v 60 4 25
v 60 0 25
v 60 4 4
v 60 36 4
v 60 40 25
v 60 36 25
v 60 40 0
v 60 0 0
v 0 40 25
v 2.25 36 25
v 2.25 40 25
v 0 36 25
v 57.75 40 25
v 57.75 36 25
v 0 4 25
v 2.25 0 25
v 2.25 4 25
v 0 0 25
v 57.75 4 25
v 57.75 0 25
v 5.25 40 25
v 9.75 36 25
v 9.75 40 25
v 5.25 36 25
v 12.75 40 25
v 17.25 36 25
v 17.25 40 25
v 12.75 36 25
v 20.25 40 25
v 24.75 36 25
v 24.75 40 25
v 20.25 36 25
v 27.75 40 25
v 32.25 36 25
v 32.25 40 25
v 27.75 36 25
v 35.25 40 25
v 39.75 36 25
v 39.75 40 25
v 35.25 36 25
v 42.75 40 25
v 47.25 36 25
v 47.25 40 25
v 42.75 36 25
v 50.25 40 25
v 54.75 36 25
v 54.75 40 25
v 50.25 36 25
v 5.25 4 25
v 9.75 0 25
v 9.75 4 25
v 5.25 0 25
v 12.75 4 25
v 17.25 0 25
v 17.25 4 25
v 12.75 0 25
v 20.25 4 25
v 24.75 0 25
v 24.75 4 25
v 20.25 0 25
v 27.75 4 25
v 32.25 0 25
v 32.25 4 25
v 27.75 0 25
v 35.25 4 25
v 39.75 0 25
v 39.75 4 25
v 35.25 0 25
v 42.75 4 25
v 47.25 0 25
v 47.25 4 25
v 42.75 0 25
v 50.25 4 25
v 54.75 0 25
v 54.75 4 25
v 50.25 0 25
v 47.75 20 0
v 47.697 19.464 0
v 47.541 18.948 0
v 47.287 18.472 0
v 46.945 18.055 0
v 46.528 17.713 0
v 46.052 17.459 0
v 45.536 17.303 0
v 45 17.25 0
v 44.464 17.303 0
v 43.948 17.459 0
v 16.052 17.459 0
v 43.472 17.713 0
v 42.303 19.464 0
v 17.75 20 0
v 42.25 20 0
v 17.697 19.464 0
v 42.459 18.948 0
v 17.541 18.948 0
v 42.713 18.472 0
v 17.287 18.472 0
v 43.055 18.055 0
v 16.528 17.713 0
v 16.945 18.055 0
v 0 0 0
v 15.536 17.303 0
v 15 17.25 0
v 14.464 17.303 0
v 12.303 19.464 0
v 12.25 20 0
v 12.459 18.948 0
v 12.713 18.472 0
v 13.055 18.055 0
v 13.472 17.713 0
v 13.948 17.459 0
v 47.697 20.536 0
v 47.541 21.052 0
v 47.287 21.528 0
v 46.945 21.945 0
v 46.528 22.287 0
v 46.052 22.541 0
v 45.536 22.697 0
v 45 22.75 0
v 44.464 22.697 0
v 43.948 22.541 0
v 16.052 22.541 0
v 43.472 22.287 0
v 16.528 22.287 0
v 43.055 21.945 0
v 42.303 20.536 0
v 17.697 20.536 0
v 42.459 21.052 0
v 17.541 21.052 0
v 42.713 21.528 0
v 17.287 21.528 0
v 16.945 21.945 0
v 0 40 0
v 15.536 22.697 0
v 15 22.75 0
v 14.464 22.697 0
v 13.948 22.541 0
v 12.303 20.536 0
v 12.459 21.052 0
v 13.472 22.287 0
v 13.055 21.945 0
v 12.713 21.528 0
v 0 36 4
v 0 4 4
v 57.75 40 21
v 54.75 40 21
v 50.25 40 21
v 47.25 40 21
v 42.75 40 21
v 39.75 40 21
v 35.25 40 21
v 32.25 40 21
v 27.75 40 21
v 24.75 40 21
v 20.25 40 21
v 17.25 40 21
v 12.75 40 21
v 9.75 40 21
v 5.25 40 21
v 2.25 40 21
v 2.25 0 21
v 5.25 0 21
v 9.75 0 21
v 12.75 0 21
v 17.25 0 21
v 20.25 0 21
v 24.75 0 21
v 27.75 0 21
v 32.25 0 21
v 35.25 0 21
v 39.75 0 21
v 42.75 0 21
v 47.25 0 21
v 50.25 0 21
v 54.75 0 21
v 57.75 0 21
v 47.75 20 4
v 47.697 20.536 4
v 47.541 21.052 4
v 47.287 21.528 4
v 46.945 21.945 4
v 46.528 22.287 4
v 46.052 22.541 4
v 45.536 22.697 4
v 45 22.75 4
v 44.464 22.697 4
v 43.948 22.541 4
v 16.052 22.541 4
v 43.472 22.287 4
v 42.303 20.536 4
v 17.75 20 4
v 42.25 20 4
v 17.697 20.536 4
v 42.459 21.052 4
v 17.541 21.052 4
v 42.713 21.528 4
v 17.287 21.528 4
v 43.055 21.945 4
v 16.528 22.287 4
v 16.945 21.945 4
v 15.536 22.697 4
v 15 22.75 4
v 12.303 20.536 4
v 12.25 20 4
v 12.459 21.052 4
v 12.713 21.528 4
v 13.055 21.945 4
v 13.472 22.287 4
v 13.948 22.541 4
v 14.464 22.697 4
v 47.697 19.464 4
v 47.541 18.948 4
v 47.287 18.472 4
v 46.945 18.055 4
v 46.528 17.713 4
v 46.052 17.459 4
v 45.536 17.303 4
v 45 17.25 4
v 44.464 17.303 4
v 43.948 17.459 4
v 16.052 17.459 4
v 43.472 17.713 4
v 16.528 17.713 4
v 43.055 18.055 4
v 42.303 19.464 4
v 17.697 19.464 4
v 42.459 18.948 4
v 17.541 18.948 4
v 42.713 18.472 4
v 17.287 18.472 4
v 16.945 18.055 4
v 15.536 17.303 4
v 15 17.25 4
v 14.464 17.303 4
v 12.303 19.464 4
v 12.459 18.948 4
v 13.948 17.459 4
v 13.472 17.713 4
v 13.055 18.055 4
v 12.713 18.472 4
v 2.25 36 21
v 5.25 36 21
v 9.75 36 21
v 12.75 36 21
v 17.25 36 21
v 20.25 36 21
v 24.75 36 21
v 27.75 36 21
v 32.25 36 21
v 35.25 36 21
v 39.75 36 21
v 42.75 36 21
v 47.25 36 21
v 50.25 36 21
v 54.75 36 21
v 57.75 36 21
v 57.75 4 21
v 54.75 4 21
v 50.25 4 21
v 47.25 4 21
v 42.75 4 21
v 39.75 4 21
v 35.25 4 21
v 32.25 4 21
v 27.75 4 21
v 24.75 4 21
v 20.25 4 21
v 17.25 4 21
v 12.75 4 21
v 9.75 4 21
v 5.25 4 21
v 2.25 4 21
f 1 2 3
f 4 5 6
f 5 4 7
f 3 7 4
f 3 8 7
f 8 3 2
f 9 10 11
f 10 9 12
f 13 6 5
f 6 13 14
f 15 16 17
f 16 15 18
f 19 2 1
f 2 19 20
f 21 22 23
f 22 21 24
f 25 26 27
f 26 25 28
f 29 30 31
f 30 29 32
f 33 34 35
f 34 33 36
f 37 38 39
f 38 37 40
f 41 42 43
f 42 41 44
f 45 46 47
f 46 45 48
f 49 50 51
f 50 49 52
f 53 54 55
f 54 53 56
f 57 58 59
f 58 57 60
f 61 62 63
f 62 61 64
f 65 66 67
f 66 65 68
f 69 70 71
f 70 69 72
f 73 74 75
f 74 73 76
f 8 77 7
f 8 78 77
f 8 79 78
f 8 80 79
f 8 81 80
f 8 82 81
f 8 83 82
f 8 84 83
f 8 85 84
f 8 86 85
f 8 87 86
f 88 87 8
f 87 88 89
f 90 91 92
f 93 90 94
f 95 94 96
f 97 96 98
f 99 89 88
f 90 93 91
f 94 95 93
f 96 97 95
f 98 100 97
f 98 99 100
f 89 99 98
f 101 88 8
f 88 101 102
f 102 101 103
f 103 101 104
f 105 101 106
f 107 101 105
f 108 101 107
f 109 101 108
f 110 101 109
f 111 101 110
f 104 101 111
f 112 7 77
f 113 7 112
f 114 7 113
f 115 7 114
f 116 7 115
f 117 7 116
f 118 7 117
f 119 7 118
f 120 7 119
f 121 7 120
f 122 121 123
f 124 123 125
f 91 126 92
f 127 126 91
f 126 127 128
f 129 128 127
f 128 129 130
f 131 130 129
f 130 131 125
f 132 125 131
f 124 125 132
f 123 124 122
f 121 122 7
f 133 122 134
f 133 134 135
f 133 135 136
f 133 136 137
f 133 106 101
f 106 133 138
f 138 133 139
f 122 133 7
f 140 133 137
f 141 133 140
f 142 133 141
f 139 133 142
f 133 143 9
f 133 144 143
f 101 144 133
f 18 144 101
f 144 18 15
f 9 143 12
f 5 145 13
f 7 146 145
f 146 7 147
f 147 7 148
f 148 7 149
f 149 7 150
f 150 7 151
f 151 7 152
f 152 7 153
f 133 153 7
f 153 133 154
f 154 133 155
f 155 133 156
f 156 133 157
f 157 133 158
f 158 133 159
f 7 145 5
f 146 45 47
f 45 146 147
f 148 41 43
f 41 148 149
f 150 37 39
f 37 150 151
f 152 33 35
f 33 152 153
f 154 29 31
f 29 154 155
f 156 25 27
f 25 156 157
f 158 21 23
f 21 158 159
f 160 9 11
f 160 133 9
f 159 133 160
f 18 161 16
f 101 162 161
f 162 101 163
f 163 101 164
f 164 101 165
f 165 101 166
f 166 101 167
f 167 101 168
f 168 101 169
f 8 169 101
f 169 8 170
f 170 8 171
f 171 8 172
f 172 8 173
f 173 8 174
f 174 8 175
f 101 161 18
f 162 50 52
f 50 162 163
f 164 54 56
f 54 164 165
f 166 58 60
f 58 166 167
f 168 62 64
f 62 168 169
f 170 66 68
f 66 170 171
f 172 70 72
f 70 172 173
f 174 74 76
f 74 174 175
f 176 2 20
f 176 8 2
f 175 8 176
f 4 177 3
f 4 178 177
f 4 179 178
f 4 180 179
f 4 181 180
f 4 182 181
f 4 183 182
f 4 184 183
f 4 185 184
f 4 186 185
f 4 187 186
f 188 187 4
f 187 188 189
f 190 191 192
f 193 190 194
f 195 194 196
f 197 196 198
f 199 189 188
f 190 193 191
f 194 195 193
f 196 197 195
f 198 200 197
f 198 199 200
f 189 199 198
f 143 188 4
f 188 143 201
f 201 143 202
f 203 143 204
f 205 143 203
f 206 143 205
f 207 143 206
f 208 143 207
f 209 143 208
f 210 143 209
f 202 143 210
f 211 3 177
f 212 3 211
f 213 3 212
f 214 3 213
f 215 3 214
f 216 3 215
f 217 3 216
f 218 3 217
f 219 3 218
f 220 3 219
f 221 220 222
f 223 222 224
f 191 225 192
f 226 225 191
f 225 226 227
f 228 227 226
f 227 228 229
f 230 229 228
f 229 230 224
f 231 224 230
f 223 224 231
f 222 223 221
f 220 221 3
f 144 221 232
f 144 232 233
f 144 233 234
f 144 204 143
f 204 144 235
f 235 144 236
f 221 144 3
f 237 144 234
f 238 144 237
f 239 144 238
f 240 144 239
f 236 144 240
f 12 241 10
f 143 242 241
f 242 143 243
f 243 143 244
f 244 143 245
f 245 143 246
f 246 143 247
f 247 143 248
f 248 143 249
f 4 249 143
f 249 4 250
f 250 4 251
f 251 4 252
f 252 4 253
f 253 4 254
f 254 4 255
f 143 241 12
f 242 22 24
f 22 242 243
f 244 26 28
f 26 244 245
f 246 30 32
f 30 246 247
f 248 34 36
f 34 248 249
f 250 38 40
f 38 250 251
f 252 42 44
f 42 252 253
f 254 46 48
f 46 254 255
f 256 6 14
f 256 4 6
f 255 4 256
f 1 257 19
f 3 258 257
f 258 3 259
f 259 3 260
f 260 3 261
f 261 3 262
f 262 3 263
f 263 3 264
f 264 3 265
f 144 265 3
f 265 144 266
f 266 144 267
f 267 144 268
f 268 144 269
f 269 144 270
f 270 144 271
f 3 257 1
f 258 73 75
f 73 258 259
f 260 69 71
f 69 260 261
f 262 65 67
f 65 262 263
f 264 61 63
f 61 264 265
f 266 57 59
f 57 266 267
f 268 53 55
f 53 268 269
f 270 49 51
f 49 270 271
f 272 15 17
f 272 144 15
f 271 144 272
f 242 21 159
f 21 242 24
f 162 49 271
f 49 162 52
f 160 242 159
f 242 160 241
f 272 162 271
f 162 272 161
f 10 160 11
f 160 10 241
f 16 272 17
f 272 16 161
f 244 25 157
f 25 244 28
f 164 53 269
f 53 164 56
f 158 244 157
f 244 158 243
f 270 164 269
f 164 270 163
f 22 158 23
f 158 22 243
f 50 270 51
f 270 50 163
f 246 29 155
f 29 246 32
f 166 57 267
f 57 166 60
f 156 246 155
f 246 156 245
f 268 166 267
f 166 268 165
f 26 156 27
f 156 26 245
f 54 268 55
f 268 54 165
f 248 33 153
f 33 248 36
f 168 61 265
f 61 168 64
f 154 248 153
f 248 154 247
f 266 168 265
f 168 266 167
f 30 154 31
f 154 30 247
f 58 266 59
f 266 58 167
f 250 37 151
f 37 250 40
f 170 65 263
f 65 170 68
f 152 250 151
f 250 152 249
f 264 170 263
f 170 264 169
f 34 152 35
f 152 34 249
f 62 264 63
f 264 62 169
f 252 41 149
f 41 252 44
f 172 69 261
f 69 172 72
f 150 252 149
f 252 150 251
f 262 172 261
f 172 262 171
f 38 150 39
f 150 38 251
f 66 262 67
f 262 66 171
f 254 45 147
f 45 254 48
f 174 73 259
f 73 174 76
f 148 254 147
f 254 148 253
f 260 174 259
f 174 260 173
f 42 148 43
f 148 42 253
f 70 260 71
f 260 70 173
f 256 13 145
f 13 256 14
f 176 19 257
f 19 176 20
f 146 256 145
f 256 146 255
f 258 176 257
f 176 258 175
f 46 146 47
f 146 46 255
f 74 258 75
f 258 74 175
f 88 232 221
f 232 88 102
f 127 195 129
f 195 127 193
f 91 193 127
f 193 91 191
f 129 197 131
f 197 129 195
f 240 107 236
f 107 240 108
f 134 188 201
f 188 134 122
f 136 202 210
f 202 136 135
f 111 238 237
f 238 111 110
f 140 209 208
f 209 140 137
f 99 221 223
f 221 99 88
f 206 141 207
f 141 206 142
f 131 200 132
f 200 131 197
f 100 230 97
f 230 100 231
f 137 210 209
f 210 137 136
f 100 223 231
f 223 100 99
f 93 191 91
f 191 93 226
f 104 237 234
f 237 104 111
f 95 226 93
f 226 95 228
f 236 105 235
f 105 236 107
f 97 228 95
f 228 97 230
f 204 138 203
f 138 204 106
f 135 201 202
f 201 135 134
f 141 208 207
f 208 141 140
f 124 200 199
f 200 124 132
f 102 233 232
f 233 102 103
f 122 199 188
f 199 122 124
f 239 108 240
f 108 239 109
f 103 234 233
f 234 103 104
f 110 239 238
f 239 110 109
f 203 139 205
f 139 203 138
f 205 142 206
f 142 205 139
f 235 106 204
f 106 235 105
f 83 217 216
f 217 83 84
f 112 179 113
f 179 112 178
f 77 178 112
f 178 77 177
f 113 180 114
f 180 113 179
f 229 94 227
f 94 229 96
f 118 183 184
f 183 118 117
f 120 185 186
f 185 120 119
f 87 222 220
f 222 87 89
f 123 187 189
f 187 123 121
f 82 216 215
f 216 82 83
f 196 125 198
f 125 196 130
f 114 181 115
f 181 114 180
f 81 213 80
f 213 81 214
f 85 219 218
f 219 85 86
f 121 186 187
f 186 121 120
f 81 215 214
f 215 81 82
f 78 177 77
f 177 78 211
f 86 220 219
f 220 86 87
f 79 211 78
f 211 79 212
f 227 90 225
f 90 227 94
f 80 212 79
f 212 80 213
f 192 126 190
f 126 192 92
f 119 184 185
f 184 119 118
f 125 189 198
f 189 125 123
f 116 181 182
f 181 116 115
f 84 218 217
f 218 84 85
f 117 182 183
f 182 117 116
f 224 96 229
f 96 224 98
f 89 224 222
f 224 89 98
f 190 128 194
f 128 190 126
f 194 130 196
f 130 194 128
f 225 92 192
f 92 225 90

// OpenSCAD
$fn = 32;

// ----------------------------------------------------------------------
// Cable duct: 60 x 40 x 25 mm, 8 fingers
// ----------------------------------------------------------------------

// --- parameters (mm) ---
tray_len = 60;            // duct length, X
tray_w = 40;              // duct width, Y
tray_h = 25;              // duct height, Z
tray_t = 4;               // side wall thickness
floor_t = 4;              // floor thickness
slot_w = 3;               // finger slot width
slot_h = 17;              // finger slot height
fingers = 8;              // number of finger slots per side
pitch = 7.5;              // finger pitch
hole_d = 5.5;             // floor mounting hole
hole_n = 2;               // mounting holes in the floor

module shell() {
  difference() {
    cube([tray_len, tray_w, tray_h]);
    /* open top channel */
    translate([-tray_t - 1, tray_t, floor_t])
      cube([tray_len + 2 * tray_t + 2, tray_w - 2 * tray_t, tray_h + 1]);
  }
}

difference() {
  union() {
    shell();
  }
  /* finger slots cut through both side walls */
  for (i = [0 : fingers - 1]) translate([pitch / 2 + i * pitch - slot_w / 2, -1, floor_t + slot_h]) cube([slot_w, tray_w + 2, tray_h]);
  for (i = [0 : hole_n - 1]) translate([(tray_len / hole_n) * (i + 0.5), tray_w / 2, -1]) cylinder(h = floor_t + 2, d = hole_d);
}
